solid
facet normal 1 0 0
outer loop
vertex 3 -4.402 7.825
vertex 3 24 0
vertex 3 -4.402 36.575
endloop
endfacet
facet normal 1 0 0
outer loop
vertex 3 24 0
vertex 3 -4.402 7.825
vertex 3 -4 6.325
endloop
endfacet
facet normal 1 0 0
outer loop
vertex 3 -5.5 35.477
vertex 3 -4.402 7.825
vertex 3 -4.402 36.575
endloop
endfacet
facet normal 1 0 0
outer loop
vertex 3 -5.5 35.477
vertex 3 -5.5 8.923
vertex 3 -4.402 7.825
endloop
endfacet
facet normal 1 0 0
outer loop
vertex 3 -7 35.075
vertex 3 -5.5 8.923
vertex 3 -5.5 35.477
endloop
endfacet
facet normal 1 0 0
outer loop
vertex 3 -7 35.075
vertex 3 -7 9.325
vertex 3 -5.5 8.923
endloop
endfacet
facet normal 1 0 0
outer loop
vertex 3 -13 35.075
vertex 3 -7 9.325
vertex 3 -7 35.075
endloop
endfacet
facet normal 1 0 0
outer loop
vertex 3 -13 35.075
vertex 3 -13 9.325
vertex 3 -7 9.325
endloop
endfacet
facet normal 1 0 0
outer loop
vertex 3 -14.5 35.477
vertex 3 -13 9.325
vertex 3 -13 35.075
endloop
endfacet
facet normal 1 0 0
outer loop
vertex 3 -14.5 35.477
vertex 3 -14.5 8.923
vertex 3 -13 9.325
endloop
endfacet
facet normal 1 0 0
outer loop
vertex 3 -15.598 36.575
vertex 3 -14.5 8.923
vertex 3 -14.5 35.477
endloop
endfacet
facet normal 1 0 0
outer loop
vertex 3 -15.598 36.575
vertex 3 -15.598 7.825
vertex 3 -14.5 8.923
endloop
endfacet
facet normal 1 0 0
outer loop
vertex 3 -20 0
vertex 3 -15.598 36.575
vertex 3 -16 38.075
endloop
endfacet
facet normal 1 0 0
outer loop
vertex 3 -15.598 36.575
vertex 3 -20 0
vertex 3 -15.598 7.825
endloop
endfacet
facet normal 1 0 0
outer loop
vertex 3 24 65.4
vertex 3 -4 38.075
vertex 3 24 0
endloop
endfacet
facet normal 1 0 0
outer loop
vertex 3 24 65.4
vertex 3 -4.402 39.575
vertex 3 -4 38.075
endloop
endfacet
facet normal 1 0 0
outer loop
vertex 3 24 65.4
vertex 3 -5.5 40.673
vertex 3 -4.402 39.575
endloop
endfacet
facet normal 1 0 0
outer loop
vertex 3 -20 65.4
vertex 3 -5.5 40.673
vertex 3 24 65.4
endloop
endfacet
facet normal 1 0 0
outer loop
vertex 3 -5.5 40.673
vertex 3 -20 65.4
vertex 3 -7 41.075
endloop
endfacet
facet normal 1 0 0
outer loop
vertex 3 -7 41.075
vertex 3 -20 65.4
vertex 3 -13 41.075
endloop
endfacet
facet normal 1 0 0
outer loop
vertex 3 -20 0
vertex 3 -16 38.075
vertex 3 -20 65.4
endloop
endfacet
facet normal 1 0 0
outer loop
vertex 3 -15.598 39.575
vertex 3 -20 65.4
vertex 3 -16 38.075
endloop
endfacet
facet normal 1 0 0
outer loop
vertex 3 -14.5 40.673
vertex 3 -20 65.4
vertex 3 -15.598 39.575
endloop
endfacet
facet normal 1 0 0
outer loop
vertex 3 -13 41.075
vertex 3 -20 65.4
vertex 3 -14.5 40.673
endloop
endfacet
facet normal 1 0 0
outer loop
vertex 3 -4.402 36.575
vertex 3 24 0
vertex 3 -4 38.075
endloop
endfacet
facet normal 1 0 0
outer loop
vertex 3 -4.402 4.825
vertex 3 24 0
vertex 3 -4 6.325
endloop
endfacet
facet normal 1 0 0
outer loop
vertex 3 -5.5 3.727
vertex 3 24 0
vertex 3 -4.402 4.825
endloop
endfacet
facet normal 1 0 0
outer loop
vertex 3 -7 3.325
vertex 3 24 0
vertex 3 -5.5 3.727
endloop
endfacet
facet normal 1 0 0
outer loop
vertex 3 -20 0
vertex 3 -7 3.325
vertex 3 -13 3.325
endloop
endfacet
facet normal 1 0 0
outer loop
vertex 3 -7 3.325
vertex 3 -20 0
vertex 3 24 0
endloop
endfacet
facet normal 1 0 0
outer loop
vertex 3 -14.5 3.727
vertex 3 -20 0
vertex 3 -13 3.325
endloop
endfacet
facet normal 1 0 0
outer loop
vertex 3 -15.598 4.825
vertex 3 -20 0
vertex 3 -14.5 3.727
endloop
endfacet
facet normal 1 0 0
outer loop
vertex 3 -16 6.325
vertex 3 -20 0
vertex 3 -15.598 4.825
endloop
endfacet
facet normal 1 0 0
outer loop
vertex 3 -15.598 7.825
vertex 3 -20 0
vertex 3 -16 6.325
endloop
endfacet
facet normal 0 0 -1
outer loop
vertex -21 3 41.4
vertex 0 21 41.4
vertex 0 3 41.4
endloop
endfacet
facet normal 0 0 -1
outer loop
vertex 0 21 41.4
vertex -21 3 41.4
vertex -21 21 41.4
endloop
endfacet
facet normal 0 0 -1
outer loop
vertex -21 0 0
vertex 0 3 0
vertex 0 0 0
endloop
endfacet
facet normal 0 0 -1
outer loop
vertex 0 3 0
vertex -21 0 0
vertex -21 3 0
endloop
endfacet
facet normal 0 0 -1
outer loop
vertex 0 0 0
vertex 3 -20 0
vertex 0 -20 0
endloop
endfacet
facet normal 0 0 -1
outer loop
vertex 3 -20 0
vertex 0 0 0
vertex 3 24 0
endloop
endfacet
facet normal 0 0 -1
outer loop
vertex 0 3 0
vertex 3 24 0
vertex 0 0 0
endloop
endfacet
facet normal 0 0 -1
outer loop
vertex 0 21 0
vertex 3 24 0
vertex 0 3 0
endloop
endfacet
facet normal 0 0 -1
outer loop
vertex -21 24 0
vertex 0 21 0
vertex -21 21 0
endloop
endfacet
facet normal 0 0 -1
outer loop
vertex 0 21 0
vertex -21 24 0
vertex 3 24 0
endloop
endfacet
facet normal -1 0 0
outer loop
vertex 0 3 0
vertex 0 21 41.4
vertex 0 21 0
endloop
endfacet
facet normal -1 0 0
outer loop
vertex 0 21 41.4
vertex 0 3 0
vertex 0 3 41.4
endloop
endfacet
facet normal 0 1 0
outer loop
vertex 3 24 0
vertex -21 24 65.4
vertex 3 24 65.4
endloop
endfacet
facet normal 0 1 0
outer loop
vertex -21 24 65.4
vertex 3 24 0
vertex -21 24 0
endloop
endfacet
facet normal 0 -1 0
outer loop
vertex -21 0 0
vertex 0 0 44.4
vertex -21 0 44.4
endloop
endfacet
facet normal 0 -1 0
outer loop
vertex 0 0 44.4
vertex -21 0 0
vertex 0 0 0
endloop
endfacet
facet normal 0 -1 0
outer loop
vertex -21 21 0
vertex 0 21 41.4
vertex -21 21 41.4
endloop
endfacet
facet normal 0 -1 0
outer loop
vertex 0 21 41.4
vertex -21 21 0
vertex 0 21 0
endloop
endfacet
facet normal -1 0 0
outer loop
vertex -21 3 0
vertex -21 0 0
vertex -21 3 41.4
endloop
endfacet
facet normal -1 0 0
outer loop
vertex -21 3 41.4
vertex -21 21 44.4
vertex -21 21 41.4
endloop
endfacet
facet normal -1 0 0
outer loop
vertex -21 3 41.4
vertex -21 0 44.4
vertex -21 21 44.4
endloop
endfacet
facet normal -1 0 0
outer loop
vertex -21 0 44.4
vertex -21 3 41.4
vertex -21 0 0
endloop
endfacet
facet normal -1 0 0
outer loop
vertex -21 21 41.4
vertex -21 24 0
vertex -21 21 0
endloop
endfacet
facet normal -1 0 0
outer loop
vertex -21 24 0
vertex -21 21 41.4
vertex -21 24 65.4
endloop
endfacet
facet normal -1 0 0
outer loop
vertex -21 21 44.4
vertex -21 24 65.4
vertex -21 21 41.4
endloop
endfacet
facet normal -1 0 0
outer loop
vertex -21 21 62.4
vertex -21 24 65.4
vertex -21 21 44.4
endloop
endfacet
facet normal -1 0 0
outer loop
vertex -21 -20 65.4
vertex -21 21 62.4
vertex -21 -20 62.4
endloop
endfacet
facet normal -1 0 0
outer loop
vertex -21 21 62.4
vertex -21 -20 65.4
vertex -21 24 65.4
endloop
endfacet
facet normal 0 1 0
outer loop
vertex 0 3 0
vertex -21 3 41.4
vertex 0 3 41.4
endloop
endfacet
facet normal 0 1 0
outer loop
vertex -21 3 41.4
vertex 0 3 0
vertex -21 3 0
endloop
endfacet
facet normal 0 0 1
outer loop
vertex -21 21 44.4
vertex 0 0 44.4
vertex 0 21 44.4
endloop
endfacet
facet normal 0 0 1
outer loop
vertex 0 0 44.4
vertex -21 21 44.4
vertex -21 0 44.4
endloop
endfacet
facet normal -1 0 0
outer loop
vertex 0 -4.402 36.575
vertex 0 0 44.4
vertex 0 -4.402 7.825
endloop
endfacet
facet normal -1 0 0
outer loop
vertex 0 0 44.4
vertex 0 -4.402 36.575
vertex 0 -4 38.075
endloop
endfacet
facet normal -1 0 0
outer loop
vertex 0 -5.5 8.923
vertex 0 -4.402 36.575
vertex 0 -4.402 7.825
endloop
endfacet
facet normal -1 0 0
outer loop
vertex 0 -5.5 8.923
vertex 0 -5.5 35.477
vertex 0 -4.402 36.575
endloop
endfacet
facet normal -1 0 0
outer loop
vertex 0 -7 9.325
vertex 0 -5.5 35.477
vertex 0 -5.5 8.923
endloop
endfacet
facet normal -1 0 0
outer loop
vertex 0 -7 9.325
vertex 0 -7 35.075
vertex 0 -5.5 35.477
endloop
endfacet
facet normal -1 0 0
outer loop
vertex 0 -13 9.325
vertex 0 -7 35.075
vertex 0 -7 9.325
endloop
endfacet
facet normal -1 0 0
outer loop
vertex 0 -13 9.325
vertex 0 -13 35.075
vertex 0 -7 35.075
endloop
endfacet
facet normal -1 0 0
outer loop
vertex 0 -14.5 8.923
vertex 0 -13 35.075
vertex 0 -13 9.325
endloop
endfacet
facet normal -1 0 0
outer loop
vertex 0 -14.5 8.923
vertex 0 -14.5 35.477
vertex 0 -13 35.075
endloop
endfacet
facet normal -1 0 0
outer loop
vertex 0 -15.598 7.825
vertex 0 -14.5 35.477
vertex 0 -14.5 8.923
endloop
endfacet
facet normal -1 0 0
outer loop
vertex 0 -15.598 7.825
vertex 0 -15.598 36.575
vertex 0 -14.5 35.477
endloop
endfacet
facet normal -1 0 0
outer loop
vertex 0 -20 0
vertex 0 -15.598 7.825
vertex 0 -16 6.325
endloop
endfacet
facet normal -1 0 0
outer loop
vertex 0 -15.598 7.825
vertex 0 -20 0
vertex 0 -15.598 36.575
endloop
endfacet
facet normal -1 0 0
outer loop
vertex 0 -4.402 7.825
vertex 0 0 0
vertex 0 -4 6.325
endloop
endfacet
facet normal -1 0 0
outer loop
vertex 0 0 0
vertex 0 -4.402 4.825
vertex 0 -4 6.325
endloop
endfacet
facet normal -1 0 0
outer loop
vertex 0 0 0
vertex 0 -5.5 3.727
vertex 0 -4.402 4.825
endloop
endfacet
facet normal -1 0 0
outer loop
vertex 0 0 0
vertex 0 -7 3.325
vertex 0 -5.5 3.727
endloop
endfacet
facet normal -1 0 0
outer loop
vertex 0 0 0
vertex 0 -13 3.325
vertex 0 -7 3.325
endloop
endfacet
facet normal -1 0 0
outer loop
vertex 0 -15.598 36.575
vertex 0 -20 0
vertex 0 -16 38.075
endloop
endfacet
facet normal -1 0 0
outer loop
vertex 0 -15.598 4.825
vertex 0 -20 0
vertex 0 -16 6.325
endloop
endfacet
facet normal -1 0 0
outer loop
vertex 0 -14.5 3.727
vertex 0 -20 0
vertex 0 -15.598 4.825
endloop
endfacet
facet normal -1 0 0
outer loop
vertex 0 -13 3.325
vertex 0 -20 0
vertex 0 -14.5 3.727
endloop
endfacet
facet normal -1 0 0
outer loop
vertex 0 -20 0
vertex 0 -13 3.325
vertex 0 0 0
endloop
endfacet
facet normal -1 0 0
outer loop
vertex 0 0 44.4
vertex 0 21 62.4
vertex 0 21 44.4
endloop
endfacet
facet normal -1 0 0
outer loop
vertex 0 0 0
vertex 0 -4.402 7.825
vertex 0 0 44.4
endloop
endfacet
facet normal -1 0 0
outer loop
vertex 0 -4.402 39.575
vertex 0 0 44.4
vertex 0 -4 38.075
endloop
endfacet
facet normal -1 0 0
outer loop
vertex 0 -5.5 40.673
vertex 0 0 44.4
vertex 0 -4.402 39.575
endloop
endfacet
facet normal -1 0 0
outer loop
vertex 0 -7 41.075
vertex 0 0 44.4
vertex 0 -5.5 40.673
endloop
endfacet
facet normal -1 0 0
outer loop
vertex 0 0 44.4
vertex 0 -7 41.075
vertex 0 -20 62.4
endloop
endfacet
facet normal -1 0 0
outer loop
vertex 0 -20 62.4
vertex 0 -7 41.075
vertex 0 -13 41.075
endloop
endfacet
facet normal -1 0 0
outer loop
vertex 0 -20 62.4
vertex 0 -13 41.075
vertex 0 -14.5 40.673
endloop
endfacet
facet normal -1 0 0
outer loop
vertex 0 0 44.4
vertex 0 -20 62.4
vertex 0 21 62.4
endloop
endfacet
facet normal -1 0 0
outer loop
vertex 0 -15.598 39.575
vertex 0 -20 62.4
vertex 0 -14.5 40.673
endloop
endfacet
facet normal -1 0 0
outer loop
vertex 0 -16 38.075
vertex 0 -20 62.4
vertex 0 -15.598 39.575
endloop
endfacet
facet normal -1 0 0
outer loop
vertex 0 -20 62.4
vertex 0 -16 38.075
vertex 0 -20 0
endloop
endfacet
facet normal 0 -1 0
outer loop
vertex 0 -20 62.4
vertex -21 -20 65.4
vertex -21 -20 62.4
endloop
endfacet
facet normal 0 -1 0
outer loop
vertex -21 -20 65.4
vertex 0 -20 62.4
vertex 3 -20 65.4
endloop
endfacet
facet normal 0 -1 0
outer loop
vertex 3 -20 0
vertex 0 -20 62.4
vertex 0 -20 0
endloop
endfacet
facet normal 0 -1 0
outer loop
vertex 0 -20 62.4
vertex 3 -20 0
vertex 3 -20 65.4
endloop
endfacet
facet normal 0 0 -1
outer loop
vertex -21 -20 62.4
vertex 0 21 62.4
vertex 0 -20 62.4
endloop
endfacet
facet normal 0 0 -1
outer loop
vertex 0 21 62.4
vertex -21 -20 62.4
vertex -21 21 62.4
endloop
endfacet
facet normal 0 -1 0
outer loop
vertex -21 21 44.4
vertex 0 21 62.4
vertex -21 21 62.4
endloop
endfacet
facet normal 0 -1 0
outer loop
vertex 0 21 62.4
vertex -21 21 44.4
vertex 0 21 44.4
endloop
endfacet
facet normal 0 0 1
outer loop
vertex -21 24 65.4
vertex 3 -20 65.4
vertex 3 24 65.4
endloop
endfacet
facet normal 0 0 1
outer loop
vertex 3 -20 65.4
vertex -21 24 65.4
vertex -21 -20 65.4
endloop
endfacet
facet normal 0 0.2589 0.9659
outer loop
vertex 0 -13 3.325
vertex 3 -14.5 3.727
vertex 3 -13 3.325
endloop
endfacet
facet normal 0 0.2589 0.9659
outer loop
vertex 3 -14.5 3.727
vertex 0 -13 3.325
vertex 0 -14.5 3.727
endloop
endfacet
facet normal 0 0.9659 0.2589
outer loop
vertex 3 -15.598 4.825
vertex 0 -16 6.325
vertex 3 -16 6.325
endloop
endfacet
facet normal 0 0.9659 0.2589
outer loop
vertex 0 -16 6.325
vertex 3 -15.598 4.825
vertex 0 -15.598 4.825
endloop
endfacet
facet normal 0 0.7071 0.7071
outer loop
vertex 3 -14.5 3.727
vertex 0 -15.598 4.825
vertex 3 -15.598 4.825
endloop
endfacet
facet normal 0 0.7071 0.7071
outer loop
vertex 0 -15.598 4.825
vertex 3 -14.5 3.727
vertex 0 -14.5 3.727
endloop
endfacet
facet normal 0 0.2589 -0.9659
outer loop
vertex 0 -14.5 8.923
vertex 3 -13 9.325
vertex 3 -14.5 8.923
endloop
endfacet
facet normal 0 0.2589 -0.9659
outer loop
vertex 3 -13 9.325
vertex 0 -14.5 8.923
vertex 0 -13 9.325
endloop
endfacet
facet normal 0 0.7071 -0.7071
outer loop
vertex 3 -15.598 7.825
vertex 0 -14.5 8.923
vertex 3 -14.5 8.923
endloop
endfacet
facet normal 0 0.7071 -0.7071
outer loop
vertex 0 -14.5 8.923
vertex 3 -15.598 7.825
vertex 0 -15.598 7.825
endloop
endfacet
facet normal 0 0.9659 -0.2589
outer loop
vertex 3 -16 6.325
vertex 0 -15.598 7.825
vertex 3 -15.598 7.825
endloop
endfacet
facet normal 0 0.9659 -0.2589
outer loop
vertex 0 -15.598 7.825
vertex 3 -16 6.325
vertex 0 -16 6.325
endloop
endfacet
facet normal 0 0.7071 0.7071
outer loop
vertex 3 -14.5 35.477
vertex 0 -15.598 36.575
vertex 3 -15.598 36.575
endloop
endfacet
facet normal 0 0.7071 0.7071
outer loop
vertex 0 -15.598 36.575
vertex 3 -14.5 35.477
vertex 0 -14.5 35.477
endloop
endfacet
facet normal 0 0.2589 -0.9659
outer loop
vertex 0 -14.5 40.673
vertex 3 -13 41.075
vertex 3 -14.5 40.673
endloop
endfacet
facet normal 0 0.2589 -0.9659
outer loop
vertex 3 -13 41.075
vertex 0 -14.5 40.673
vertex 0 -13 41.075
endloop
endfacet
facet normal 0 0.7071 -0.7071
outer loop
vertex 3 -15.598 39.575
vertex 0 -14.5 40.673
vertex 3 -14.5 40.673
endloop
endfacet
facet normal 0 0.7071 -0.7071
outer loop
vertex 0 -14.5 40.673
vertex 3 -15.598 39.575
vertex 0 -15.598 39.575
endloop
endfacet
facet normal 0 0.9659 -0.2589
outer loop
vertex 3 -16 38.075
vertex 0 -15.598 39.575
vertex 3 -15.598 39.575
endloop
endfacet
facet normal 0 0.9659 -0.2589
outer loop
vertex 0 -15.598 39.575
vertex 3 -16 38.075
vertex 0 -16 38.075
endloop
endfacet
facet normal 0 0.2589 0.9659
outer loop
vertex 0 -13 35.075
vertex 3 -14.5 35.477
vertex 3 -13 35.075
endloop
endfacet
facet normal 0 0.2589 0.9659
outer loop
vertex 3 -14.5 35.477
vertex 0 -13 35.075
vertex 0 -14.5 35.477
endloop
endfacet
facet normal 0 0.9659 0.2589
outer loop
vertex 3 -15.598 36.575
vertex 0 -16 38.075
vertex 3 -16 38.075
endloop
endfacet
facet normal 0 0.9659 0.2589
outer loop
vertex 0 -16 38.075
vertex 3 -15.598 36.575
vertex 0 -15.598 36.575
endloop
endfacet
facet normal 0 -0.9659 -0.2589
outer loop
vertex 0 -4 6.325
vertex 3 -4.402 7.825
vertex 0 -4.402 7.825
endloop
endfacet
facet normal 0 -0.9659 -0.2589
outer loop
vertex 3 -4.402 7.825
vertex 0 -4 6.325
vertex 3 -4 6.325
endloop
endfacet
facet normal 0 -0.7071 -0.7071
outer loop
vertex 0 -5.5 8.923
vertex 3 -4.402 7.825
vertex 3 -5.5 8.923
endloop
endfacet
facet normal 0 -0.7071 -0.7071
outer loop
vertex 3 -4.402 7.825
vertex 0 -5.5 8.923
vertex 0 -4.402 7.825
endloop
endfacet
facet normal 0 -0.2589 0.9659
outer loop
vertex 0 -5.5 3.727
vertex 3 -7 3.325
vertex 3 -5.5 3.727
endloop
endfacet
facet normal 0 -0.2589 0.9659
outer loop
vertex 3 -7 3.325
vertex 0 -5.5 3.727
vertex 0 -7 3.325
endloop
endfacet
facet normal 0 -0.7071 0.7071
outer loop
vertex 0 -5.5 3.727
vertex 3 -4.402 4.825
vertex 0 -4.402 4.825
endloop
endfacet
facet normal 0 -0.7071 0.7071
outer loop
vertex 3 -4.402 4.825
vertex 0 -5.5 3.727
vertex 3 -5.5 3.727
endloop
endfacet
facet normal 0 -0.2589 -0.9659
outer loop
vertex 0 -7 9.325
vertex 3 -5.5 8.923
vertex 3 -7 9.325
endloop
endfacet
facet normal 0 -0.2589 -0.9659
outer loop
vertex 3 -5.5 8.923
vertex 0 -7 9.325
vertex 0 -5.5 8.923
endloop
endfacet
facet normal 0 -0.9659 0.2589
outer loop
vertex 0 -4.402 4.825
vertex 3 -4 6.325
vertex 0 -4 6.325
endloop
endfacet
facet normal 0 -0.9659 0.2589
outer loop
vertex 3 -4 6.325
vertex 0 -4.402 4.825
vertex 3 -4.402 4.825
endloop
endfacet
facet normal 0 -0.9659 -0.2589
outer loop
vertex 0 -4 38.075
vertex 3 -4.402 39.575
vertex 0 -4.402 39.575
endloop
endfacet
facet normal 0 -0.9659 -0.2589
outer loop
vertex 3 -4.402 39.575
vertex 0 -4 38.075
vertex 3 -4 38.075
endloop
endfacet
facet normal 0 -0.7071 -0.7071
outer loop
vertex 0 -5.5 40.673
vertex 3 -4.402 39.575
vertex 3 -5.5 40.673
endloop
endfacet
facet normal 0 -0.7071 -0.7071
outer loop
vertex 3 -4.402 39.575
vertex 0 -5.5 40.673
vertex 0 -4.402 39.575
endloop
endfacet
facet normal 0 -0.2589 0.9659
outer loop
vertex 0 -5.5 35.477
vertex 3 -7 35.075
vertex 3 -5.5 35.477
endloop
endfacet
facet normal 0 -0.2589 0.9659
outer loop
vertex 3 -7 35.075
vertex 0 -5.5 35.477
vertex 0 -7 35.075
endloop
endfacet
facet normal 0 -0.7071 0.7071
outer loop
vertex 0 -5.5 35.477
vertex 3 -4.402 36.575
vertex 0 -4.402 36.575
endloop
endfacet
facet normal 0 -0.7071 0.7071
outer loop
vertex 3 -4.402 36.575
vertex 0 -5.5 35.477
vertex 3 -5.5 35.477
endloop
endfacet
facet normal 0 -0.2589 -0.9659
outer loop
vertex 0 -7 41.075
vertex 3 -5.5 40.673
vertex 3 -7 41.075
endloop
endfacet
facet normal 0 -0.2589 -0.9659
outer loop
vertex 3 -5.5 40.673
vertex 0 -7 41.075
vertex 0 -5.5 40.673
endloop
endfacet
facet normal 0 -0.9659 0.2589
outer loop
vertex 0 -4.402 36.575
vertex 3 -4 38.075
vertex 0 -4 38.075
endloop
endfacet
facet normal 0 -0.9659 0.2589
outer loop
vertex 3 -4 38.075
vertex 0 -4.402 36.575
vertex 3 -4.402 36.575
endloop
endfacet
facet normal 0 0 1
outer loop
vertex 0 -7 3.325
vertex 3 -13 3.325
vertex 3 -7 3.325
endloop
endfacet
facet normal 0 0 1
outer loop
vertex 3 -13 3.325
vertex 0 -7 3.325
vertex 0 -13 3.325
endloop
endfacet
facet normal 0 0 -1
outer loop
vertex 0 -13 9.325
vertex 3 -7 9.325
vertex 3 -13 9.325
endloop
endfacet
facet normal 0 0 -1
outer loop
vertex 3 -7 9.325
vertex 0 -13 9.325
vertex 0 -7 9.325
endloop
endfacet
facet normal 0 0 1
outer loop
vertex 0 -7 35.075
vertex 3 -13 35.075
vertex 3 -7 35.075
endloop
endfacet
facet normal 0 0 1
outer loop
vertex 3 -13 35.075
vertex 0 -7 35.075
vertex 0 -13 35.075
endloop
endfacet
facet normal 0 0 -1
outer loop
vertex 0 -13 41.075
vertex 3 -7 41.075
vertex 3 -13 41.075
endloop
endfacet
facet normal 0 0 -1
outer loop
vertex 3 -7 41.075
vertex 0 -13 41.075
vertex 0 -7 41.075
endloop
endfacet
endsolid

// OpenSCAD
// Parametric 1U Rack
// GNU GPL v3
// Churuata3D Průša <churuata.3dprojects@gmail.com>
// https://www.instagram.com/churuata3d/
// https://www.facebook.com/churuata3d

//Wood or Material thickness
thickness=18;
//printable wall thickness
wall=3;
$fn=12;

module rack(thickness,wall){
    
    //
    width=20;
    L=44.4;
    H=31.75;
    R=3;
    X=(44.4-31.75)/2;
    depth=10;

//final body
difference() {
        //main body
        union(){    
            cube([wall,thickness+2*wall,L-wall],0);
            translate ([0,thickness+wall,0]) rotate ([0,0,90]) cube([wall,thickness+wall,L-wall],0);
            translate ([0,0,0]) rotate ([0,0,90]) cube([wall,thickness+wall,L-wall],0);
            translate ([-(thickness+wall),0,L]) rotate ([0,90,0]) cube([wall,thickness+2*wall,thickness+2*wall],0);
            translate ([0,-(width),0]) rotate ([0,0,0]) cube([wall,width,L],0);
            translate ([0,thickness+wall,L]) rotate ([0,0,90]) cube([wall,thickness+wall,thickness],0);
            translate ([0,-width,L]) rotate ([0,0,0]) cube([wall,thickness+2*wall+width,thickness],0);
            translate ([-(thickness+wall),-width,L+thickness+wall]) rotate ([0,90,0]) cube([wall,thickness+2*wall+width,thickness+2*wall],0);
        }
        //holes boolean difference
        union(){
            translate ([-wall,-((width/2)+R),X]) rotate ([0,90,0]) cylinder(h=10, r=R);
            translate ([-wall,-((width/2)+R),X+H]) rotate ([0,90,0]) cylinder(h=10, r=R);
            translate ([-wall,-(width/2)+R,X]) rotate ([0,90,0]) cylinder(h=depth, r=R);
            translate ([-wall,-(width/2)+R,X+H]) rotate ([0,90,0]) cylinder(h=depth, r=R);
            translate ([-wall,-(width/2)-R,X+R]) rotate ([0,90,0]) cube([2*R,2*R,depth],0);
            translate ([-wall,-(width/2)-R,X+H+R]) rotate ([0,90,0]) cube([2*R,2*R,depth],0);
        }
        
        //translate ([depth/2,thickness+R,L]) rotate ([0,45,90]) cube([depth,H,depth/2],0);
    }
}

rack(thickness,wall);
//translate ([0,thickness*wall,0]) mirror([0,2,0]) rack(thickness,wall) ;
